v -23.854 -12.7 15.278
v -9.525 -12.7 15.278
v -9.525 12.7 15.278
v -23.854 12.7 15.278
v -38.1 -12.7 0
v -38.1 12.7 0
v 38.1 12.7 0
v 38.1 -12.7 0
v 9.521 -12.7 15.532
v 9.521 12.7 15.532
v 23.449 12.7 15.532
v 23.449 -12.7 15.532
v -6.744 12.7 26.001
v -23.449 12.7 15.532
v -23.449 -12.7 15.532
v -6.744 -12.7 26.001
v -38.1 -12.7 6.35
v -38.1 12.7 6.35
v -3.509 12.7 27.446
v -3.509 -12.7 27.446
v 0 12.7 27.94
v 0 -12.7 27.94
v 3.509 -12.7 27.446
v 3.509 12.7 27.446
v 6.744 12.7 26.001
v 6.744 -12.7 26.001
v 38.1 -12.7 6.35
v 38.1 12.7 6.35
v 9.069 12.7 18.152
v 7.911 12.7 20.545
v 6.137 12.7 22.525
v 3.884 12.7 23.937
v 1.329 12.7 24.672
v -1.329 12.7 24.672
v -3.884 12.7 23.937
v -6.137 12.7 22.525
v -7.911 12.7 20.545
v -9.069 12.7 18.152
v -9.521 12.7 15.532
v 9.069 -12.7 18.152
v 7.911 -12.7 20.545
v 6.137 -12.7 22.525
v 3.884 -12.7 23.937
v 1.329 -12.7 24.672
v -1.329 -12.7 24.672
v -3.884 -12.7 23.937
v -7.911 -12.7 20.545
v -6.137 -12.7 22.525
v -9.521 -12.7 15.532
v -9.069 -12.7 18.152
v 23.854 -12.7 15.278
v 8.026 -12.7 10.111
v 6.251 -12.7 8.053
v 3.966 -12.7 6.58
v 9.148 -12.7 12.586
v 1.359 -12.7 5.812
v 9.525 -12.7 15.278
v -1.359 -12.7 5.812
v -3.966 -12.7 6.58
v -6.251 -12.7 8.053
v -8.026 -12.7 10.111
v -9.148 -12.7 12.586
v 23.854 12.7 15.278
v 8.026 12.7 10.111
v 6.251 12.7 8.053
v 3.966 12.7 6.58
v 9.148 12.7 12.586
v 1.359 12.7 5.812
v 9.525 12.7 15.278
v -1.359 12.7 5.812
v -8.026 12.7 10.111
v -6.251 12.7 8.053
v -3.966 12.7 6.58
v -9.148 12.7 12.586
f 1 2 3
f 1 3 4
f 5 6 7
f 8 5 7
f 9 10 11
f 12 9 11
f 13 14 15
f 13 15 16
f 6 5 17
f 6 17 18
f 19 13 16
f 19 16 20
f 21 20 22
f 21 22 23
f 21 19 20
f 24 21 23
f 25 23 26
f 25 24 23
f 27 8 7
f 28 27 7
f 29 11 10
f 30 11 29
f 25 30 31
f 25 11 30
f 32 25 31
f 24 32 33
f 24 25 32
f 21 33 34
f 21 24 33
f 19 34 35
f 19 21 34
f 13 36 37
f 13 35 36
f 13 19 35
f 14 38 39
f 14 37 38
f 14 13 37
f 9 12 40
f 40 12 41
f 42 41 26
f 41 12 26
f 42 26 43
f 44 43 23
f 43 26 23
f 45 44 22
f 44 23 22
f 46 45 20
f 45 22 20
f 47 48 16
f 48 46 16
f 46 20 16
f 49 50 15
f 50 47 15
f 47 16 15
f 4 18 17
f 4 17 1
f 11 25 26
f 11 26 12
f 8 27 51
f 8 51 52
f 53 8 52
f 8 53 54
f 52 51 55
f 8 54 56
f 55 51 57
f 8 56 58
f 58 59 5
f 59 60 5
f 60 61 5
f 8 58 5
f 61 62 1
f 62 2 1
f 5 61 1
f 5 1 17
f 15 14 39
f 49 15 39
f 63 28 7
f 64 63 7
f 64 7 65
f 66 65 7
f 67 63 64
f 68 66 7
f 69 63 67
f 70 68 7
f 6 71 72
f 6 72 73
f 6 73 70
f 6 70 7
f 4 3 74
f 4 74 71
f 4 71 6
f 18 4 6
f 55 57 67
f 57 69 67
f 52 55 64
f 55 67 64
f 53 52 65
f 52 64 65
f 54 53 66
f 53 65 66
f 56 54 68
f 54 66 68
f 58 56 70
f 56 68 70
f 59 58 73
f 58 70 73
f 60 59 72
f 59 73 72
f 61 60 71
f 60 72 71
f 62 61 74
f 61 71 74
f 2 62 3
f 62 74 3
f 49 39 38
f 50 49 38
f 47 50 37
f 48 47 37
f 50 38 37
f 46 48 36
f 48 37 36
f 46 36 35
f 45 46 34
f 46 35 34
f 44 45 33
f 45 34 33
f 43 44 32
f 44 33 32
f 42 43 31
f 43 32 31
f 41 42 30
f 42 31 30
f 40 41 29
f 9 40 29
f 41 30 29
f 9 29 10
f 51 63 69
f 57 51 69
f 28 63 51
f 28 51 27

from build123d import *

# Parameters (mm, degrees)
F0_W     = 76.2
F0_H     = 25.4
F1_DEPTH = 6.35
F3_DEPTH = 25.4
F4_R     = 9.525
F5_DEPTH = 25.4
F7_DEPTH = 25.4


with BuildPart() as f1:
    # F0 (on Top) → F1 (new body)
    with BuildSketch(Plane.XY):
        Rectangle(F0_W, F0_H)
    extrude(amount=F1_DEPTH)

    # F2 (on face) → F3 (join, through all)
    with BuildSketch(Plane(origin=(0, 12.7, 0), x_dir=(-1, 0, 0), z_dir=(0, 1, 0))):
        with BuildLine():
            ThreePointArc((-3.4195796525, 6.35), (-5.3923153102, 23.0916597351), (9.525, 15.24))
            ThreePointArc((9.525, 15.24), (7.8516597351, 9.8476846898), (3.4195796525, 6.35))
            Line((3.4195796525, 6.35), (38.1, 6.35))
            Line((38.1, 6.35), (6.7442919348, 26.0012511493))
            ThreePointArc((6.7442919348, 26.0012511493), (0, 27.94), (-6.7442919348, 26.0012511493))
            Line((-6.7442919348, 26.0012511493), (-38.1, 6.35))
            Line((-38.1, 6.35), (-3.4195796525, 6.35))
        make_face()
        with BuildLine():
            ThreePointArc((3.4195796525, 6.35), (7.8516597351, 9.8476846898), (9.525, 15.24))
            ThreePointArc((9.525, 15.24), (-5.3923153102, 23.0916597351), (-3.4195796525, 6.35))
            Line((-3.4195796525, 6.35), (3.4195796525, 6.35))
        make_face()
    extrude(amount=-F3_DEPTH)

    # F4 (on face) → F5 (cut, through all)
    with BuildSketch(Plane(origin=(0, 12.7, 0), x_dir=(-1, 0, 0), z_dir=(0, 1, 0))):
        with Locations((0, 15.24)):
            Circle(F4_R)
    extrude(amount=-F5_DEPTH, mode=Mode.SUBTRACT)

    # F6 (on face) → F7 (cut, through all)
    with BuildSketch(Plane(origin=(0, 12.7, 0), x_dir=(-1, 0, 0), z_dir=(0, 1, 0))):
        with BuildLine():
            Line((23.4489112285, 15.5321311916), (9.5205191228, 15.5321311916))
            ThreePointArc((9.5205191228, 15.5321311916), (9.5235682304, 15.4051458763), (9.5249236749, 15.2781311916))
            Line((9.5249236749, 15.2781311916), (23.8541958482, 15.2781311916))
            Line((23.8541958482, 15.2781311916), (23.4489112285, 15.5321311916))
        make_face()
        with BuildLine():
            Line((-9.5205191228, 15.5321311916), (-23.4489112285, 15.5321311916))
            Line((-23.4489112285, 15.5321311916), (-23.8541958482, 15.2781311916))
            Line((-23.8541958482, 15.2781311916), (-9.5249236749, 15.2781311916))
            ThreePointArc((-9.5249236749, 15.2781311916), (-9.5235682304, 15.4051458763), (-9.5205191228, 15.5321311916))
        make_face()
    extrude(amount=-F7_DEPTH, mode=Mode.SUBTRACT)


solid = f1.part
